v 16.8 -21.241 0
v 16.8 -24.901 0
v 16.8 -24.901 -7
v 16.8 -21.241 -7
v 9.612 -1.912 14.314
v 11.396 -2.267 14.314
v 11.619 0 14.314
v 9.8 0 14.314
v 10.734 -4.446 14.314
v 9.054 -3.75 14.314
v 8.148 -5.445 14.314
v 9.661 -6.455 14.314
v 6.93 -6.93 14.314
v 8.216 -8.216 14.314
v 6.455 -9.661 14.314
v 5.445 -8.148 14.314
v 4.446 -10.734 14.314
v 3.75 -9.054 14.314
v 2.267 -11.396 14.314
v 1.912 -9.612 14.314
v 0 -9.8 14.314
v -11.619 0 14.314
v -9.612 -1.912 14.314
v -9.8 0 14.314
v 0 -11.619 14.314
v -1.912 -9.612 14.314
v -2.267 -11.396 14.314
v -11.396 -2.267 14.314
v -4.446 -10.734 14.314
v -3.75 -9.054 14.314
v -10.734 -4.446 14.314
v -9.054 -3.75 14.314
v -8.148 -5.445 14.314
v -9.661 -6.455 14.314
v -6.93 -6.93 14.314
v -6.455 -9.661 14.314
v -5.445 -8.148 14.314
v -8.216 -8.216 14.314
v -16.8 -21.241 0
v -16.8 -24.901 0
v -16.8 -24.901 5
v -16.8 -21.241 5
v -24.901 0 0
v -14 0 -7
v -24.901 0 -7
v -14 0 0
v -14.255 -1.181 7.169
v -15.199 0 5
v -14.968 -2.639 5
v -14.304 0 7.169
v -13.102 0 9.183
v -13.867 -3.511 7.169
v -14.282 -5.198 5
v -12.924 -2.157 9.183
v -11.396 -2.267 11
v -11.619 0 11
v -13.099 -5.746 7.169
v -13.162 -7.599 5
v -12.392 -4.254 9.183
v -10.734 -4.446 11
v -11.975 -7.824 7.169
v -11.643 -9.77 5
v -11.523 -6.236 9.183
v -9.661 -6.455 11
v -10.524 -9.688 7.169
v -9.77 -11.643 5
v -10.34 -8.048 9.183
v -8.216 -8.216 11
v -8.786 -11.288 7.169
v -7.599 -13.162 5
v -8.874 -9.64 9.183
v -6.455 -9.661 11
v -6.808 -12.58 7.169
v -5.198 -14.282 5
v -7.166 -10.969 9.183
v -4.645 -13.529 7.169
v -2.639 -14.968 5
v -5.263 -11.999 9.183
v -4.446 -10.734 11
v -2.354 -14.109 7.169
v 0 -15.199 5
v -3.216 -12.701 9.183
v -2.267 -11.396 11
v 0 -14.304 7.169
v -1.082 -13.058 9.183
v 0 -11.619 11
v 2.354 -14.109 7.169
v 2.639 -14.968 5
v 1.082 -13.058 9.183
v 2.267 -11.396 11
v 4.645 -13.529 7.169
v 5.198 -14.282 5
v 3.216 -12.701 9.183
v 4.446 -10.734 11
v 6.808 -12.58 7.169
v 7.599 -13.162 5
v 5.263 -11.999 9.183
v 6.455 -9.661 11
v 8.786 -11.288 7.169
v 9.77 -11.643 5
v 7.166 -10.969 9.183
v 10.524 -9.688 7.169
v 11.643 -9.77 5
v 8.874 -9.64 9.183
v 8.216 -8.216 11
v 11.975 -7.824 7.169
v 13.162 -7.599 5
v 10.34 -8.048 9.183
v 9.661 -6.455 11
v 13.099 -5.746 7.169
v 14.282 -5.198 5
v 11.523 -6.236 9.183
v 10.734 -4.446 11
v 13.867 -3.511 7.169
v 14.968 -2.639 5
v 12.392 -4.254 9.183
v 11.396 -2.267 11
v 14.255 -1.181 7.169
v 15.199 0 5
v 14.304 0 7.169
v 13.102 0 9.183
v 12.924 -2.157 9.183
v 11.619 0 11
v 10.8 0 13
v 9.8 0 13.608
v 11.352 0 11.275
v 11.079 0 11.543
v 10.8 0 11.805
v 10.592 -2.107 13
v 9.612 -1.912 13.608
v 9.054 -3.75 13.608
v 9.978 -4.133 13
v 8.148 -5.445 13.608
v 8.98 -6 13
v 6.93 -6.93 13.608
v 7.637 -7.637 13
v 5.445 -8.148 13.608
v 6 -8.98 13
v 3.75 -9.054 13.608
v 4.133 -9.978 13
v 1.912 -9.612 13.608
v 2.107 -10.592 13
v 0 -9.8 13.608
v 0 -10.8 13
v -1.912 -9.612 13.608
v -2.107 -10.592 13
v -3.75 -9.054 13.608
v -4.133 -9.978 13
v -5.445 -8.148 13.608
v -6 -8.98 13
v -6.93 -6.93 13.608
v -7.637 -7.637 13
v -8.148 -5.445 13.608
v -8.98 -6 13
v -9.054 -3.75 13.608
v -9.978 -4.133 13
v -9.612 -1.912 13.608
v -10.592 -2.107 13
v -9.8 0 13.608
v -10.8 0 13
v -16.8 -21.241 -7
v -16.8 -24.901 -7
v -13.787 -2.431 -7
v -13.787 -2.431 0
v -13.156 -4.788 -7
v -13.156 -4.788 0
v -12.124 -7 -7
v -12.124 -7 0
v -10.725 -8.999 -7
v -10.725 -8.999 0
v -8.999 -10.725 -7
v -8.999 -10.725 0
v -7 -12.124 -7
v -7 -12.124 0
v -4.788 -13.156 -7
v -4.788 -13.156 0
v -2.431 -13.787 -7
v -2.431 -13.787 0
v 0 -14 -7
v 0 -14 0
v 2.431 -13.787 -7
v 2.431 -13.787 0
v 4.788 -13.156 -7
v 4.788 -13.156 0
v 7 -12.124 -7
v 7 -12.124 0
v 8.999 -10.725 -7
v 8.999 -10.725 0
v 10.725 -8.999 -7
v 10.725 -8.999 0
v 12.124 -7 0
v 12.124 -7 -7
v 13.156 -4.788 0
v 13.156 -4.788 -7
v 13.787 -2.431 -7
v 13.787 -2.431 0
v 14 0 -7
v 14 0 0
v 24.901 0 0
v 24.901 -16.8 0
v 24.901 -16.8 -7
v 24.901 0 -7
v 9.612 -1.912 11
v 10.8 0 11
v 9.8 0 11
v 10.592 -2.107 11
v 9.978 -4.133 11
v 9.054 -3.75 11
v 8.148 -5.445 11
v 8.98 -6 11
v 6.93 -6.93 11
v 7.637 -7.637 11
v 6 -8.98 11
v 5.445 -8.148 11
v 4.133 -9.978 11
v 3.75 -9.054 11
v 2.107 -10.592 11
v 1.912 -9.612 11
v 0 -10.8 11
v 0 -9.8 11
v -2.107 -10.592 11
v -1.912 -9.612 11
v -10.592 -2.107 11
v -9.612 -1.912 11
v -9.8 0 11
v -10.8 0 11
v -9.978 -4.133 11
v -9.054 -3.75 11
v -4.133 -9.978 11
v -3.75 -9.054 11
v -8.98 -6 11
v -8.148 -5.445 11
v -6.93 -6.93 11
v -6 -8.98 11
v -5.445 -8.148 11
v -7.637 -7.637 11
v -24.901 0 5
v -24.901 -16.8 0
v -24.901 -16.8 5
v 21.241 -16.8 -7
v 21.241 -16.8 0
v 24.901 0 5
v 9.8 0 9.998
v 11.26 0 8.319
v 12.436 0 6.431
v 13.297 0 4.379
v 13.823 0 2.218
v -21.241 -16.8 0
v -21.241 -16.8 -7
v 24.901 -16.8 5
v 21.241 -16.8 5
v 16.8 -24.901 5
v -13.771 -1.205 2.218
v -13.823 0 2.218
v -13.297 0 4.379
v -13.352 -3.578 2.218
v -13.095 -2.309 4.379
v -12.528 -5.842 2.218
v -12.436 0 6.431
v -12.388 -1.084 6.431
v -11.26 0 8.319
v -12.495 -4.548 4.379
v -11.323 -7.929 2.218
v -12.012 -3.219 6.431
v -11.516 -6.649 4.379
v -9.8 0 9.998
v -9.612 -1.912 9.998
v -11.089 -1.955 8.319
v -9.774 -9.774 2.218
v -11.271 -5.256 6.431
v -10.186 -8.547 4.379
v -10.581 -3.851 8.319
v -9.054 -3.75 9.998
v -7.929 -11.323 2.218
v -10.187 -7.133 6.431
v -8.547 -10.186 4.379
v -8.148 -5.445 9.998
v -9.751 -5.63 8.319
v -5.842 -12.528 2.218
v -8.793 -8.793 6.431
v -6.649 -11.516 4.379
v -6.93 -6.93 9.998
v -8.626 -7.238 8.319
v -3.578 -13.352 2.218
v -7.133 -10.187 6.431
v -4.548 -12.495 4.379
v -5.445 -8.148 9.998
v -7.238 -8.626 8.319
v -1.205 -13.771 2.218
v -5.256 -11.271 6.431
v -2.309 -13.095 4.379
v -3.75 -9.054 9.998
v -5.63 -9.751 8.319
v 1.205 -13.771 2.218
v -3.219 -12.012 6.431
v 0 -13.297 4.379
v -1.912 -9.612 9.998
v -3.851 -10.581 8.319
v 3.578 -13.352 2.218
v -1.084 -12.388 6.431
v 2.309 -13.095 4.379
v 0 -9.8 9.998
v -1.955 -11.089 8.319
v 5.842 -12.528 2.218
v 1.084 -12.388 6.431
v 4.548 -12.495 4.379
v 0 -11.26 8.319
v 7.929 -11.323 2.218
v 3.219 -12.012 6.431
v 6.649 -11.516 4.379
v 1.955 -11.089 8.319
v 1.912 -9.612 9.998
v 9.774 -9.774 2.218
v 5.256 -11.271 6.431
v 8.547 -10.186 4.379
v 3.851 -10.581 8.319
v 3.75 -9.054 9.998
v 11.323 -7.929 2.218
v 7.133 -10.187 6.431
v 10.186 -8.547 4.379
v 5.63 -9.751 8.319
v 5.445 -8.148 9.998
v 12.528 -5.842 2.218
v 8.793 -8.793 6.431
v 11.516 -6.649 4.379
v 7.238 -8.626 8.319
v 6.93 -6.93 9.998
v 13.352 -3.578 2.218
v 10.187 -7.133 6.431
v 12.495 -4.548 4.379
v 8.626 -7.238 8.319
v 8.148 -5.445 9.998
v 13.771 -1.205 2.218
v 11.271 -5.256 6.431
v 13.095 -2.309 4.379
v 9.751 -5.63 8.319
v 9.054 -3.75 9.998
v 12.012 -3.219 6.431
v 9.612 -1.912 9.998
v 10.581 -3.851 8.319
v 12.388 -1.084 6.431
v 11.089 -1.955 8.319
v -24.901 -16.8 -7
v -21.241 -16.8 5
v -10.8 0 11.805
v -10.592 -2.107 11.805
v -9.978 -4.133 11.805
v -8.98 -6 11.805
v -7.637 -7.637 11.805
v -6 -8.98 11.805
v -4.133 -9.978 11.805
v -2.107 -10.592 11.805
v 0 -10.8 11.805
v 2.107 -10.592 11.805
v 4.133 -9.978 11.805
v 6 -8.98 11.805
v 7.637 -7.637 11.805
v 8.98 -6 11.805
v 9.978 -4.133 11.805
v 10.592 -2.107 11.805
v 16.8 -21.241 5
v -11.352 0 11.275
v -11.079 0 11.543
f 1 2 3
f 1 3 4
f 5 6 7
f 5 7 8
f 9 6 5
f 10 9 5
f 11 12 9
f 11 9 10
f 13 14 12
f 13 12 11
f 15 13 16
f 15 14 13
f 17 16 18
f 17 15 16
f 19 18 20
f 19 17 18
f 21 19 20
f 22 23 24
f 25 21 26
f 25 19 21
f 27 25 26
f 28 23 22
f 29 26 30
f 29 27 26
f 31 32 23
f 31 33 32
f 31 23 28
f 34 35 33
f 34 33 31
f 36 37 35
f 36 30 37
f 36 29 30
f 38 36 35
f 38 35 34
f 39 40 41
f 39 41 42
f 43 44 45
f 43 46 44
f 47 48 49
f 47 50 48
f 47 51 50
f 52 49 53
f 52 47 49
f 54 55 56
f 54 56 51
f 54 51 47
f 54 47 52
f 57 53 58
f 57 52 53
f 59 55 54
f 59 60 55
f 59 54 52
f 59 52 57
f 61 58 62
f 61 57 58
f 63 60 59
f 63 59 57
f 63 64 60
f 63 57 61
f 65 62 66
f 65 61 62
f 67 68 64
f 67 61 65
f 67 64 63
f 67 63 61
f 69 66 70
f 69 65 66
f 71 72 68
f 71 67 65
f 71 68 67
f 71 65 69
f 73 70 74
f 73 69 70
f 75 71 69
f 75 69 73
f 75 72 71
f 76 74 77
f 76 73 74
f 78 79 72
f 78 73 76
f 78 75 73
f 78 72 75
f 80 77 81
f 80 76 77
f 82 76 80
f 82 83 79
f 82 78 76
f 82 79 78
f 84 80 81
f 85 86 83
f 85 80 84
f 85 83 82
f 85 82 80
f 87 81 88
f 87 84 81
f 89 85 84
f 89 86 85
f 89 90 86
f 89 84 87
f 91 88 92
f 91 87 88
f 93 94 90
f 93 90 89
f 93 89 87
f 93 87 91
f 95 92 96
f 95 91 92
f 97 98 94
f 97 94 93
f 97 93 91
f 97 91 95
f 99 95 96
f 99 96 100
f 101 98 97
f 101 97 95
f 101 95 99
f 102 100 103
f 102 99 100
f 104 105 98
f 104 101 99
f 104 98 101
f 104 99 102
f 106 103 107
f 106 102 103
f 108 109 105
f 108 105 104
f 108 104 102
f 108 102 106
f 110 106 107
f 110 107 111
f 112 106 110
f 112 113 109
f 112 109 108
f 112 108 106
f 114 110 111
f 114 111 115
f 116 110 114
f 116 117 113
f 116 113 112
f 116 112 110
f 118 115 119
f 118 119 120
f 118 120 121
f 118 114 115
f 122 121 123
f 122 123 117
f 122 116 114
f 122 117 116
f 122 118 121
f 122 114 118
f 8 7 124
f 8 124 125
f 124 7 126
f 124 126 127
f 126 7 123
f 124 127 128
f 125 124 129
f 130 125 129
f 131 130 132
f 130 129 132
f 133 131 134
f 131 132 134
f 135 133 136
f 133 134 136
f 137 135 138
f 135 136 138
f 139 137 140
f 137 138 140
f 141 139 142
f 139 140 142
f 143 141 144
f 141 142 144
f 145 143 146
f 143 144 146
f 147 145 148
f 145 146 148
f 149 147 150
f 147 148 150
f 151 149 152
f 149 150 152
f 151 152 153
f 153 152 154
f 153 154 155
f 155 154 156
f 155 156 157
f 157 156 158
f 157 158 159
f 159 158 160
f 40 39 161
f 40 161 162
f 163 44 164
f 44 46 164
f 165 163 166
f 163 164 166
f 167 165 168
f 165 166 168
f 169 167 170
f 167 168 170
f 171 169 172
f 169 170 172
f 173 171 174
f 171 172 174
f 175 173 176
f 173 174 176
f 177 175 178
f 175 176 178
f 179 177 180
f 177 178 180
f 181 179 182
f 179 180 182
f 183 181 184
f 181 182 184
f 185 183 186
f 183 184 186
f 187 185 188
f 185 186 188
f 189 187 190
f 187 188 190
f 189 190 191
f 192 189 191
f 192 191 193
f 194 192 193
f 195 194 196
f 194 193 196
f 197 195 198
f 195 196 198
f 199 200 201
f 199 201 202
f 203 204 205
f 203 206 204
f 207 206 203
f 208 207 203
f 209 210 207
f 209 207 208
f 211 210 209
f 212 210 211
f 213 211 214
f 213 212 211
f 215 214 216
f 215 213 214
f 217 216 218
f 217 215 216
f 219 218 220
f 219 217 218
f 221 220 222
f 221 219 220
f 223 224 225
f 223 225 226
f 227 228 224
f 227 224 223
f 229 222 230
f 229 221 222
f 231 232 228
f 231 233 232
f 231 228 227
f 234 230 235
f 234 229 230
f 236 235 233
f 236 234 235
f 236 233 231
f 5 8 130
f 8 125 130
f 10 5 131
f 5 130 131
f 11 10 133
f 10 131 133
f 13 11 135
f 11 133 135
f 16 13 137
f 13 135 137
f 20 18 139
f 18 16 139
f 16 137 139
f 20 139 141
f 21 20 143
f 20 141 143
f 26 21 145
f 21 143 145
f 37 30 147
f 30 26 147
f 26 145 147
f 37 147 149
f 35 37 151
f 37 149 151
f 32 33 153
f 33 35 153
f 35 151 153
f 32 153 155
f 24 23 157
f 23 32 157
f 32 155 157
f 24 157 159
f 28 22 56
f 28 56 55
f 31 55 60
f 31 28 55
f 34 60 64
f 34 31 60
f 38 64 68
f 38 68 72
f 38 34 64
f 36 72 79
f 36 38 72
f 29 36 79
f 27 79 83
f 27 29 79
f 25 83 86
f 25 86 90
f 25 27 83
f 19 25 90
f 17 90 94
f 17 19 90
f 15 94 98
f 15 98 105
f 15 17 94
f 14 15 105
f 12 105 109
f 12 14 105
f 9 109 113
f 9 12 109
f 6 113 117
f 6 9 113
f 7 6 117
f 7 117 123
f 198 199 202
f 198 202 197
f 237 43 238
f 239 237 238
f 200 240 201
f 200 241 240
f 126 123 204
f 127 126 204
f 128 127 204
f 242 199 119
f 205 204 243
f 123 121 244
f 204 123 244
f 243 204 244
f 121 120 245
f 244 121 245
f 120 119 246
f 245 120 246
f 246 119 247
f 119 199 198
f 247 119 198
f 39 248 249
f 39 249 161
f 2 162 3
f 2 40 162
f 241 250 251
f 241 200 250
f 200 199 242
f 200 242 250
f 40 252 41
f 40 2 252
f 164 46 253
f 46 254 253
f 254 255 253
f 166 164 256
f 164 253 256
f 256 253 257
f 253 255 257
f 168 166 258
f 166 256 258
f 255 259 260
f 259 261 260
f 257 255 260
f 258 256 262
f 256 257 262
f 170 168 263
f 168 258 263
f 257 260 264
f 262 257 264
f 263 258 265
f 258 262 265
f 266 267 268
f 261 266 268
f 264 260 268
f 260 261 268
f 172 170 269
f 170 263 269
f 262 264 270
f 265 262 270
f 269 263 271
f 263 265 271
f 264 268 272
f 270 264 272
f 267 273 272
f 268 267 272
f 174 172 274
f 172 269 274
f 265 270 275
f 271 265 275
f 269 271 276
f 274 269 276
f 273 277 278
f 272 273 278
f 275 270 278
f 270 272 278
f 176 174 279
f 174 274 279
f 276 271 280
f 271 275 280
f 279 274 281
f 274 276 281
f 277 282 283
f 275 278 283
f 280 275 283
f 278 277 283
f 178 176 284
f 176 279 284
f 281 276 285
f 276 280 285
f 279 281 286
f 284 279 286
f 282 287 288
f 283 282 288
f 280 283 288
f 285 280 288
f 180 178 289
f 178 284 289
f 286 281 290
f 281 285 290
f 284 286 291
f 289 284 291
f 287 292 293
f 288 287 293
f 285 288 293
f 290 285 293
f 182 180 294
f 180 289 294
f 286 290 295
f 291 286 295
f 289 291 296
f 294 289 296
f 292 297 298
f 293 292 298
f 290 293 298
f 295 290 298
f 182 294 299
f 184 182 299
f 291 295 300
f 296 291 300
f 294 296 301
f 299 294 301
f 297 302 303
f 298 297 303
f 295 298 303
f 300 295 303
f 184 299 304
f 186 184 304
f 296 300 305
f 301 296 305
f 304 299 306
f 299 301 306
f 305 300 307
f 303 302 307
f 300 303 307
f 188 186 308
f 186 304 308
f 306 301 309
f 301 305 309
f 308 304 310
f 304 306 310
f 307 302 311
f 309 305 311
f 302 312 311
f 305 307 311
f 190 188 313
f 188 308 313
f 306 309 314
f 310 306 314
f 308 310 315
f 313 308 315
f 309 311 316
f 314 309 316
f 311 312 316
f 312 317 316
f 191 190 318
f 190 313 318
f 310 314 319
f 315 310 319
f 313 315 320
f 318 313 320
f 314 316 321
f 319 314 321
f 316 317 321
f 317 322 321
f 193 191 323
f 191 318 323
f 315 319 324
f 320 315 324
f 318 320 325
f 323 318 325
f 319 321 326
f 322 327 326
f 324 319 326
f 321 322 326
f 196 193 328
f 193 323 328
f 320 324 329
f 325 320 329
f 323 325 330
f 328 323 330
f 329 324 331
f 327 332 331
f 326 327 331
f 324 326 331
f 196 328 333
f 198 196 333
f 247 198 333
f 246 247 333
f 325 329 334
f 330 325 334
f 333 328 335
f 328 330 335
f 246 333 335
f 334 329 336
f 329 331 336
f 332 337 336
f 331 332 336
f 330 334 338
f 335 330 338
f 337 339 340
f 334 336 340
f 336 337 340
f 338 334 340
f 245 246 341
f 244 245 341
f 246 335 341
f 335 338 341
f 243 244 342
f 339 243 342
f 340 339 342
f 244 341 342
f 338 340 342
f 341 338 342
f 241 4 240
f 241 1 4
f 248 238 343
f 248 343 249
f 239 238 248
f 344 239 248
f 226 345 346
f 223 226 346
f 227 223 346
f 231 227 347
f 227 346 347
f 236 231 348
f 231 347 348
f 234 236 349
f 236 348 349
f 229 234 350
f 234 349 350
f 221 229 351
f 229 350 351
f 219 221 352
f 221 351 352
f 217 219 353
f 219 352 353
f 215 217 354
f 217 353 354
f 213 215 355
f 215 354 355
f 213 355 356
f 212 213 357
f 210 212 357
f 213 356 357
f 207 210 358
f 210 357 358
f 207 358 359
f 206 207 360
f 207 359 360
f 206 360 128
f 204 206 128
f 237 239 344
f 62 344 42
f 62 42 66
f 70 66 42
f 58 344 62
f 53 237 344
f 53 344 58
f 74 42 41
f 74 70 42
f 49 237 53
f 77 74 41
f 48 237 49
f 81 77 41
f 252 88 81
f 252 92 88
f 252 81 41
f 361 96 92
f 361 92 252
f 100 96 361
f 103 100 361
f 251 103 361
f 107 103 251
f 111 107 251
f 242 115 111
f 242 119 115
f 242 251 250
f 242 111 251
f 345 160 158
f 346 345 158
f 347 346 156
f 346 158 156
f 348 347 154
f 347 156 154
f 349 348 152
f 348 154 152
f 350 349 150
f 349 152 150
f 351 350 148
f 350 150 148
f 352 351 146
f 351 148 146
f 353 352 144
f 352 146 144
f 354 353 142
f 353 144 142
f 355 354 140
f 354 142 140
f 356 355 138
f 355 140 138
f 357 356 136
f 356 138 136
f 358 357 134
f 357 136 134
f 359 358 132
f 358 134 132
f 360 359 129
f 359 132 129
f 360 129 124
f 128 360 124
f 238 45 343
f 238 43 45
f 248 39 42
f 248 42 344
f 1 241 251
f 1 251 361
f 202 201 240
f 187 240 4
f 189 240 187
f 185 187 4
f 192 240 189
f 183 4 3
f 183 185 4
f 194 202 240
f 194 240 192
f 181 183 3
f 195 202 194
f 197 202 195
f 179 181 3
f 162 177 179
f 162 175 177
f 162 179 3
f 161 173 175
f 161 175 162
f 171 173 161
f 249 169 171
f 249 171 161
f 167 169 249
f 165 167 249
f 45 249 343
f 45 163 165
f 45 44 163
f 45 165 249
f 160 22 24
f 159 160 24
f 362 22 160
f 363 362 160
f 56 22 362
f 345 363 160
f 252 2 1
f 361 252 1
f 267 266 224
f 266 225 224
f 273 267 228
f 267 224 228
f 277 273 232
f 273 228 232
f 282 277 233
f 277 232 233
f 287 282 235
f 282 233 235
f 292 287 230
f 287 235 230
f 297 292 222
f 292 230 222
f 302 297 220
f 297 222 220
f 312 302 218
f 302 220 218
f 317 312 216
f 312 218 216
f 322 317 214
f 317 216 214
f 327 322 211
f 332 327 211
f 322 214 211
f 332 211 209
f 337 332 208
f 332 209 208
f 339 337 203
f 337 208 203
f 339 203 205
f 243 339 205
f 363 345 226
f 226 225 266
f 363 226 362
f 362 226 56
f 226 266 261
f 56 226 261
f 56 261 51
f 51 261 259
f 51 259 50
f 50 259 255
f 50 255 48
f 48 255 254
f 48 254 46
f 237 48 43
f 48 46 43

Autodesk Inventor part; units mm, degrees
ref_plane "YZ Plane" through (0, 0, 0) normal (1, 0, 0) x (0, 1, 0)
ref_plane "XZ Plane" through (0, 0, 0) normal (0, 1, 0) x (-1, 0, 0)
sketch "Sketch1" plane through (0, 0, 0) normal (0, 0, 1) x (1, 0, 0)
  line L0 (-36.8533, 0) -> (46.8153, 0) construction
  line L1 (0, -29.8808) -> (0, 4.9801) construction
  line L2 (0, 0) -> (24.6516, -24.6516) construction
  line L3 (0, 0) -> (34.8626, 0) construction
  line L4 (0, -24.9006) -> (16.8, -24.9006)
  line L5 (16.8, -24.9006) -> (16.8, -21.2406)
  line L6 (16.8, -21.2406) -> (19.0203, -19.0203)
  line L7 (24.9006, 0) -> (24.9006, -16.8)
  line L8 (24.9006, -16.8) -> (21.2406, -16.8)
  line L9 (21.2406, -16.8) -> (19.0203, -19.0203)
  line L10 (0, 0) -> (-24.6516, -24.6516) construction
  line L11 (0, -24.9006) -> (-16.8, -24.9006)
  line L12 (-16.8, -24.9006) -> (-16.8, -21.2406)
  line L13 (-16.8, -21.2406) -> (-19.0203, -19.0203)
  line L14 (-24.9006, 0) -> (-24.9006, -16.8)
  line L15 (-24.9006, -16.8) -> (-21.2406, -16.8)
  line L16 (-21.2406, -16.8) -> (-19.0203, -19.0203)
  arc A0 (-14, 0) -> (14, 0) centre (0, 0) ccw
  line L17 (0, 0) -> (14, 0) construction
  line L18 (0, 0) -> (-14, 0) construction
  line L19 (-14, 0) -> (-24.9006, 0)
  line L20 (14, 0) -> (24.9006, 0)
  dimension "d0" = 45
  dimension "d1" = 16.8
  dimension "d2" = 3.66
  dimension "d4" = 3.14
  dimension "d5" = 14
  dimension "d6" = 180
extrude "Extrusion1" add sketch "Sketch1" along normal blind 5
sketch "Sketch3" plane through (-24.9006, 0, 0) normal (0, 1, 0) x (1, 0, 0)
  line L0 (10.9006, 0) -> (0, 0) construction
  line L1 (0, 0) -> (0, -5) construction
  line L2 (10.9006, -5) -> (0, -5) construction
  line L3 (10.9006, 0) -> (10.9006, -5) construction
  line L4 (38.9006, 0) -> (10.9006, 0) construction
  line L5 (10.9006, 0) -> (10.9006, -5) construction
  line L6 (38.9006, -5) -> (10.9006, -5) construction
  line L7 (38.9006, 0) -> (38.9006, -5) construction
  line L8 (49.8013, 0) -> (38.9006, 0) construction
  line L9 (38.9006, 0) -> (38.9006, -5) construction
  line L10 (49.8013, -5) -> (38.9006, -5) construction
  line L11 (49.8013, 0) -> (49.8013, -5) construction
  line L12 (24.9006, 18.5006) -> (24.9006, -23.5037) construction
  arc A0 (10.9006, 0) -> (24.9006, -14) centre (24.9006, 0) ccw
  arc A1 (8.9006, 0) -> (24.9006, -16) centre (24.9006, 0) ccw
  line L13 (24.9006, -16) -> (24.9006, -14)
  line L14 (10.9006, 0) -> (0, 0) projected
  line L15 (8.9006, 0) -> (10.9006, 0)
  dimension "d11" = 2
revolve "Revolution2" add sketch "Sketch3" angle 180 about axis through (0, 0, -10) along (0, 0, 1)
ref_plane "Work Plane1" through (0, 0, 16) normal (0, 0, 1) x (1, 0, 0)
sketch "Sketch5" plane through (24.9006, 0, 5) normal (0, 1, 0) x (1, 0, 0)
  line L0 (0, 0) -> (-9.7019, 0) construction
  line L1 (0, 5) -> (0, 0) construction
  line L2 (0, 5) -> (-10.9006, 5) construction
  arc A0 (-38.9006, 5) -> (-10.9006, 5) centre (-24.9006, 5) ccw construction
  line L3 (-38.9006, 5) -> (-49.8013, 5) construction
  line L4 (-49.8013, 5) -> (-49.8013, 0) construction
  line L5 (-40.0993, 0) -> (-49.8013, 0) construction
  arc A1 (-40.0993, 0) -> (-9.7019, 0) centre (-24.9006, 5) ccw construction
  arc A2 (-38.9006, 5) -> (-10.9006, 5) centre (-24.9006, 5) ccw construction
  line L6 (-10.9006, 5) -> (-38.9006, 5) construction
  line L7 (-24.9006, 25) -> (-24.9006, -17) construction
  line L8 (-24.9006, -6) -> (-35.7006, -6)
  line L9 (-35.7006, -6) -> (-35.7006, -8.1)
  line L10 (-35.7006, -8.1) -> (-24.9006, -8.1)
  line L11 (-24.9006, -8.1) -> (-24.9006, -6)
  arc A3 (-10.9006, 5) -> (-38.9006, 5) centre (-24.9006, 5) ccw construction
  line L12 (-24.9006, 19) -> (-24.9006, -6) construction
  line L13 (-24.9006, 19) -> (0.0994, 19) construction
  line L14 (-34.7006, -6) -> (-33.5609, -6)
  line L15 (-33.5609, -6) -> (-33.5609, -4.998)
  line L16 (-33.5609, -4.998) -> (-34.7006, -4.998)
  line L17 (-34.7006, -4.998) -> (-34.7006, -6)
  arc A4 (-38.9006, 5) -> (-10.9006, 5) centre (-24.9006, 5) ccw projected
  line L18 (-24.9006, -8.1) -> (-34.087, -8.1)
  line L19 (-34.087, -8.1) -> (-34.087, -11)
  line L20 (-34.087, -11) -> (-24.9006, -11)
  line L21 (-24.9006, -11) -> (-24.9006, -8.1)
  arc A5 (-40.0993, 0) -> (-9.7019, 0) centre (-24.9006, 5) ccw projected
  dimension "d16" = 10.8
  dimension "d17" = 2.1
  dimension "d19" = 25
  dimension "d20" = 90
  dimension "d21" = 1
revolve "Revolution3" cut sketch "Sketch5" angle 360 about axis through (0, 0, -10) along (0, 0, 1) contours L11 L10 A4 L8 | A4 L10 A5 L9 L8 | L8 L17 A4 | L21 A4 L10 | A4 L21 A5 L10 | L10 L9 A5
sketch "Sketch6" plane through (-24.9006, 0, 5) normal (0, 1, 0) x (1, 0, 0)
  line L0 (14.1006, -6.8051) -> (14.1006, -6) construction
  line L1 (14.1006, -6) -> (15.1006, -6) construction
  line L2 (15.1006, -6) -> (15.1006, -4.998) construction
  arc A0 (10.9006, 5) -> (15.1006, -4.998) centre (24.9006, 5) ccw construction
  line L3 (10.9006, 5) -> (0, 5) construction
  line L4 (0, 5) -> (0, 0) construction
  line L5 (9.7019, 0) -> (0, 0) construction
  arc A1 (9.7019, 0) -> (14.1006, -6.8051) centre (24.9006, 5) ccw construction
  line L6 (24.9006, 7.4176) -> (24.9006, -9.5058) construction
  arc A2 (9.7019, 0) -> (14.1006, -6.8051) centre (24.9006, 5) ccw projected
  line L7 (13.2817, -6) -> (13.2817, -9.314)
  line L8 (14.1006, -6) -> (24.9006, -6) construction
  line L9 (24.9006, -6) -> (24.9006, -8) construction
  line L10 (24.9006, -8) -> (14.1006, -8) construction
  line L11 (14.1006, -8) -> (14.1006, -6) construction
  line L12 (35.7006, -6) -> (14.1006, -6) construction
  line L13 (14.1006, -6) -> (24.9006, -6) construction
  line L14 (24.9006, -6) -> (24.9006, -11.2) construction
  line L15 (24.9006, -11.2) -> (14.1006, -11.2) construction
  line L16 (14.1006, -11.2) -> (14.1006, -6) construction
  arc A3 (14.1006, -8) -> (24.9006, -11.2) centre (24.9006, 8.625) ccw construction
  line L17 (14.1006, -6.8051) -> (14.1006, -8)
  line L18 (13.2817, -9.314) -> (15.1006, -9.314)
  line L19 (15.1006, -9.314) -> (15.1006, -8.6084)
  line L20 (15.1006, -8.6084) -> (14.1006, -8)
  line L21 (13.2817, -6) -> (14.1006, -6)
  line L22 (35.7006, -6.8051) -> (14.1006, -6.8051) projected
  line L23 (14.1006, -6.8051) -> (14.1006, -6)
  dimension "d23" = 2
  dimension "d24" = 5.2
revolve "Revolution4" add sketch "Sketch6" angle 180 about axis through (0, 0, -10) along (0, 0, 1) contours A2 L17 L20 L19 L18 L7
sketch "Sketch7" plane through (0, 0, 0) normal (0, 0, -1) x (-1, 0, 0)
  line L0 (-24.9006, 0) -> (-14, 0) projected
  line L1 (-24.9006, -16.8) -> (-24.9006, 0) projected
  line L2 (-21.2406, -16.8) -> (-24.9006, -16.8) projected
  line L3 (-16.8, -21.2406) -> (-21.2406, -16.8) projected
  line L4 (-16.8, -24.9006) -> (-16.8, -21.2406) projected
  line L5 (16.8, -24.9006) -> (-16.8, -24.9006) projected
  line L6 (16.8, -21.2406) -> (16.8, -24.9006) projected
  line L7 (21.2406, -16.8) -> (16.8, -21.2406) projected
  line L8 (24.9006, -16.8) -> (21.2406, -16.8) projected
  line L9 (24.9006, 0) -> (24.9006, -16.8) projected
  line L10 (14, 0) -> (24.9006, 0) projected
  arc A0 (-14, 0) -> (14, 0) centre (0, 0) ccw projected
extrude "Extrusion3" add sketch "Sketch7" along normal blind 7
properties part number "20_Cube_Insert_Eye_Lens"
